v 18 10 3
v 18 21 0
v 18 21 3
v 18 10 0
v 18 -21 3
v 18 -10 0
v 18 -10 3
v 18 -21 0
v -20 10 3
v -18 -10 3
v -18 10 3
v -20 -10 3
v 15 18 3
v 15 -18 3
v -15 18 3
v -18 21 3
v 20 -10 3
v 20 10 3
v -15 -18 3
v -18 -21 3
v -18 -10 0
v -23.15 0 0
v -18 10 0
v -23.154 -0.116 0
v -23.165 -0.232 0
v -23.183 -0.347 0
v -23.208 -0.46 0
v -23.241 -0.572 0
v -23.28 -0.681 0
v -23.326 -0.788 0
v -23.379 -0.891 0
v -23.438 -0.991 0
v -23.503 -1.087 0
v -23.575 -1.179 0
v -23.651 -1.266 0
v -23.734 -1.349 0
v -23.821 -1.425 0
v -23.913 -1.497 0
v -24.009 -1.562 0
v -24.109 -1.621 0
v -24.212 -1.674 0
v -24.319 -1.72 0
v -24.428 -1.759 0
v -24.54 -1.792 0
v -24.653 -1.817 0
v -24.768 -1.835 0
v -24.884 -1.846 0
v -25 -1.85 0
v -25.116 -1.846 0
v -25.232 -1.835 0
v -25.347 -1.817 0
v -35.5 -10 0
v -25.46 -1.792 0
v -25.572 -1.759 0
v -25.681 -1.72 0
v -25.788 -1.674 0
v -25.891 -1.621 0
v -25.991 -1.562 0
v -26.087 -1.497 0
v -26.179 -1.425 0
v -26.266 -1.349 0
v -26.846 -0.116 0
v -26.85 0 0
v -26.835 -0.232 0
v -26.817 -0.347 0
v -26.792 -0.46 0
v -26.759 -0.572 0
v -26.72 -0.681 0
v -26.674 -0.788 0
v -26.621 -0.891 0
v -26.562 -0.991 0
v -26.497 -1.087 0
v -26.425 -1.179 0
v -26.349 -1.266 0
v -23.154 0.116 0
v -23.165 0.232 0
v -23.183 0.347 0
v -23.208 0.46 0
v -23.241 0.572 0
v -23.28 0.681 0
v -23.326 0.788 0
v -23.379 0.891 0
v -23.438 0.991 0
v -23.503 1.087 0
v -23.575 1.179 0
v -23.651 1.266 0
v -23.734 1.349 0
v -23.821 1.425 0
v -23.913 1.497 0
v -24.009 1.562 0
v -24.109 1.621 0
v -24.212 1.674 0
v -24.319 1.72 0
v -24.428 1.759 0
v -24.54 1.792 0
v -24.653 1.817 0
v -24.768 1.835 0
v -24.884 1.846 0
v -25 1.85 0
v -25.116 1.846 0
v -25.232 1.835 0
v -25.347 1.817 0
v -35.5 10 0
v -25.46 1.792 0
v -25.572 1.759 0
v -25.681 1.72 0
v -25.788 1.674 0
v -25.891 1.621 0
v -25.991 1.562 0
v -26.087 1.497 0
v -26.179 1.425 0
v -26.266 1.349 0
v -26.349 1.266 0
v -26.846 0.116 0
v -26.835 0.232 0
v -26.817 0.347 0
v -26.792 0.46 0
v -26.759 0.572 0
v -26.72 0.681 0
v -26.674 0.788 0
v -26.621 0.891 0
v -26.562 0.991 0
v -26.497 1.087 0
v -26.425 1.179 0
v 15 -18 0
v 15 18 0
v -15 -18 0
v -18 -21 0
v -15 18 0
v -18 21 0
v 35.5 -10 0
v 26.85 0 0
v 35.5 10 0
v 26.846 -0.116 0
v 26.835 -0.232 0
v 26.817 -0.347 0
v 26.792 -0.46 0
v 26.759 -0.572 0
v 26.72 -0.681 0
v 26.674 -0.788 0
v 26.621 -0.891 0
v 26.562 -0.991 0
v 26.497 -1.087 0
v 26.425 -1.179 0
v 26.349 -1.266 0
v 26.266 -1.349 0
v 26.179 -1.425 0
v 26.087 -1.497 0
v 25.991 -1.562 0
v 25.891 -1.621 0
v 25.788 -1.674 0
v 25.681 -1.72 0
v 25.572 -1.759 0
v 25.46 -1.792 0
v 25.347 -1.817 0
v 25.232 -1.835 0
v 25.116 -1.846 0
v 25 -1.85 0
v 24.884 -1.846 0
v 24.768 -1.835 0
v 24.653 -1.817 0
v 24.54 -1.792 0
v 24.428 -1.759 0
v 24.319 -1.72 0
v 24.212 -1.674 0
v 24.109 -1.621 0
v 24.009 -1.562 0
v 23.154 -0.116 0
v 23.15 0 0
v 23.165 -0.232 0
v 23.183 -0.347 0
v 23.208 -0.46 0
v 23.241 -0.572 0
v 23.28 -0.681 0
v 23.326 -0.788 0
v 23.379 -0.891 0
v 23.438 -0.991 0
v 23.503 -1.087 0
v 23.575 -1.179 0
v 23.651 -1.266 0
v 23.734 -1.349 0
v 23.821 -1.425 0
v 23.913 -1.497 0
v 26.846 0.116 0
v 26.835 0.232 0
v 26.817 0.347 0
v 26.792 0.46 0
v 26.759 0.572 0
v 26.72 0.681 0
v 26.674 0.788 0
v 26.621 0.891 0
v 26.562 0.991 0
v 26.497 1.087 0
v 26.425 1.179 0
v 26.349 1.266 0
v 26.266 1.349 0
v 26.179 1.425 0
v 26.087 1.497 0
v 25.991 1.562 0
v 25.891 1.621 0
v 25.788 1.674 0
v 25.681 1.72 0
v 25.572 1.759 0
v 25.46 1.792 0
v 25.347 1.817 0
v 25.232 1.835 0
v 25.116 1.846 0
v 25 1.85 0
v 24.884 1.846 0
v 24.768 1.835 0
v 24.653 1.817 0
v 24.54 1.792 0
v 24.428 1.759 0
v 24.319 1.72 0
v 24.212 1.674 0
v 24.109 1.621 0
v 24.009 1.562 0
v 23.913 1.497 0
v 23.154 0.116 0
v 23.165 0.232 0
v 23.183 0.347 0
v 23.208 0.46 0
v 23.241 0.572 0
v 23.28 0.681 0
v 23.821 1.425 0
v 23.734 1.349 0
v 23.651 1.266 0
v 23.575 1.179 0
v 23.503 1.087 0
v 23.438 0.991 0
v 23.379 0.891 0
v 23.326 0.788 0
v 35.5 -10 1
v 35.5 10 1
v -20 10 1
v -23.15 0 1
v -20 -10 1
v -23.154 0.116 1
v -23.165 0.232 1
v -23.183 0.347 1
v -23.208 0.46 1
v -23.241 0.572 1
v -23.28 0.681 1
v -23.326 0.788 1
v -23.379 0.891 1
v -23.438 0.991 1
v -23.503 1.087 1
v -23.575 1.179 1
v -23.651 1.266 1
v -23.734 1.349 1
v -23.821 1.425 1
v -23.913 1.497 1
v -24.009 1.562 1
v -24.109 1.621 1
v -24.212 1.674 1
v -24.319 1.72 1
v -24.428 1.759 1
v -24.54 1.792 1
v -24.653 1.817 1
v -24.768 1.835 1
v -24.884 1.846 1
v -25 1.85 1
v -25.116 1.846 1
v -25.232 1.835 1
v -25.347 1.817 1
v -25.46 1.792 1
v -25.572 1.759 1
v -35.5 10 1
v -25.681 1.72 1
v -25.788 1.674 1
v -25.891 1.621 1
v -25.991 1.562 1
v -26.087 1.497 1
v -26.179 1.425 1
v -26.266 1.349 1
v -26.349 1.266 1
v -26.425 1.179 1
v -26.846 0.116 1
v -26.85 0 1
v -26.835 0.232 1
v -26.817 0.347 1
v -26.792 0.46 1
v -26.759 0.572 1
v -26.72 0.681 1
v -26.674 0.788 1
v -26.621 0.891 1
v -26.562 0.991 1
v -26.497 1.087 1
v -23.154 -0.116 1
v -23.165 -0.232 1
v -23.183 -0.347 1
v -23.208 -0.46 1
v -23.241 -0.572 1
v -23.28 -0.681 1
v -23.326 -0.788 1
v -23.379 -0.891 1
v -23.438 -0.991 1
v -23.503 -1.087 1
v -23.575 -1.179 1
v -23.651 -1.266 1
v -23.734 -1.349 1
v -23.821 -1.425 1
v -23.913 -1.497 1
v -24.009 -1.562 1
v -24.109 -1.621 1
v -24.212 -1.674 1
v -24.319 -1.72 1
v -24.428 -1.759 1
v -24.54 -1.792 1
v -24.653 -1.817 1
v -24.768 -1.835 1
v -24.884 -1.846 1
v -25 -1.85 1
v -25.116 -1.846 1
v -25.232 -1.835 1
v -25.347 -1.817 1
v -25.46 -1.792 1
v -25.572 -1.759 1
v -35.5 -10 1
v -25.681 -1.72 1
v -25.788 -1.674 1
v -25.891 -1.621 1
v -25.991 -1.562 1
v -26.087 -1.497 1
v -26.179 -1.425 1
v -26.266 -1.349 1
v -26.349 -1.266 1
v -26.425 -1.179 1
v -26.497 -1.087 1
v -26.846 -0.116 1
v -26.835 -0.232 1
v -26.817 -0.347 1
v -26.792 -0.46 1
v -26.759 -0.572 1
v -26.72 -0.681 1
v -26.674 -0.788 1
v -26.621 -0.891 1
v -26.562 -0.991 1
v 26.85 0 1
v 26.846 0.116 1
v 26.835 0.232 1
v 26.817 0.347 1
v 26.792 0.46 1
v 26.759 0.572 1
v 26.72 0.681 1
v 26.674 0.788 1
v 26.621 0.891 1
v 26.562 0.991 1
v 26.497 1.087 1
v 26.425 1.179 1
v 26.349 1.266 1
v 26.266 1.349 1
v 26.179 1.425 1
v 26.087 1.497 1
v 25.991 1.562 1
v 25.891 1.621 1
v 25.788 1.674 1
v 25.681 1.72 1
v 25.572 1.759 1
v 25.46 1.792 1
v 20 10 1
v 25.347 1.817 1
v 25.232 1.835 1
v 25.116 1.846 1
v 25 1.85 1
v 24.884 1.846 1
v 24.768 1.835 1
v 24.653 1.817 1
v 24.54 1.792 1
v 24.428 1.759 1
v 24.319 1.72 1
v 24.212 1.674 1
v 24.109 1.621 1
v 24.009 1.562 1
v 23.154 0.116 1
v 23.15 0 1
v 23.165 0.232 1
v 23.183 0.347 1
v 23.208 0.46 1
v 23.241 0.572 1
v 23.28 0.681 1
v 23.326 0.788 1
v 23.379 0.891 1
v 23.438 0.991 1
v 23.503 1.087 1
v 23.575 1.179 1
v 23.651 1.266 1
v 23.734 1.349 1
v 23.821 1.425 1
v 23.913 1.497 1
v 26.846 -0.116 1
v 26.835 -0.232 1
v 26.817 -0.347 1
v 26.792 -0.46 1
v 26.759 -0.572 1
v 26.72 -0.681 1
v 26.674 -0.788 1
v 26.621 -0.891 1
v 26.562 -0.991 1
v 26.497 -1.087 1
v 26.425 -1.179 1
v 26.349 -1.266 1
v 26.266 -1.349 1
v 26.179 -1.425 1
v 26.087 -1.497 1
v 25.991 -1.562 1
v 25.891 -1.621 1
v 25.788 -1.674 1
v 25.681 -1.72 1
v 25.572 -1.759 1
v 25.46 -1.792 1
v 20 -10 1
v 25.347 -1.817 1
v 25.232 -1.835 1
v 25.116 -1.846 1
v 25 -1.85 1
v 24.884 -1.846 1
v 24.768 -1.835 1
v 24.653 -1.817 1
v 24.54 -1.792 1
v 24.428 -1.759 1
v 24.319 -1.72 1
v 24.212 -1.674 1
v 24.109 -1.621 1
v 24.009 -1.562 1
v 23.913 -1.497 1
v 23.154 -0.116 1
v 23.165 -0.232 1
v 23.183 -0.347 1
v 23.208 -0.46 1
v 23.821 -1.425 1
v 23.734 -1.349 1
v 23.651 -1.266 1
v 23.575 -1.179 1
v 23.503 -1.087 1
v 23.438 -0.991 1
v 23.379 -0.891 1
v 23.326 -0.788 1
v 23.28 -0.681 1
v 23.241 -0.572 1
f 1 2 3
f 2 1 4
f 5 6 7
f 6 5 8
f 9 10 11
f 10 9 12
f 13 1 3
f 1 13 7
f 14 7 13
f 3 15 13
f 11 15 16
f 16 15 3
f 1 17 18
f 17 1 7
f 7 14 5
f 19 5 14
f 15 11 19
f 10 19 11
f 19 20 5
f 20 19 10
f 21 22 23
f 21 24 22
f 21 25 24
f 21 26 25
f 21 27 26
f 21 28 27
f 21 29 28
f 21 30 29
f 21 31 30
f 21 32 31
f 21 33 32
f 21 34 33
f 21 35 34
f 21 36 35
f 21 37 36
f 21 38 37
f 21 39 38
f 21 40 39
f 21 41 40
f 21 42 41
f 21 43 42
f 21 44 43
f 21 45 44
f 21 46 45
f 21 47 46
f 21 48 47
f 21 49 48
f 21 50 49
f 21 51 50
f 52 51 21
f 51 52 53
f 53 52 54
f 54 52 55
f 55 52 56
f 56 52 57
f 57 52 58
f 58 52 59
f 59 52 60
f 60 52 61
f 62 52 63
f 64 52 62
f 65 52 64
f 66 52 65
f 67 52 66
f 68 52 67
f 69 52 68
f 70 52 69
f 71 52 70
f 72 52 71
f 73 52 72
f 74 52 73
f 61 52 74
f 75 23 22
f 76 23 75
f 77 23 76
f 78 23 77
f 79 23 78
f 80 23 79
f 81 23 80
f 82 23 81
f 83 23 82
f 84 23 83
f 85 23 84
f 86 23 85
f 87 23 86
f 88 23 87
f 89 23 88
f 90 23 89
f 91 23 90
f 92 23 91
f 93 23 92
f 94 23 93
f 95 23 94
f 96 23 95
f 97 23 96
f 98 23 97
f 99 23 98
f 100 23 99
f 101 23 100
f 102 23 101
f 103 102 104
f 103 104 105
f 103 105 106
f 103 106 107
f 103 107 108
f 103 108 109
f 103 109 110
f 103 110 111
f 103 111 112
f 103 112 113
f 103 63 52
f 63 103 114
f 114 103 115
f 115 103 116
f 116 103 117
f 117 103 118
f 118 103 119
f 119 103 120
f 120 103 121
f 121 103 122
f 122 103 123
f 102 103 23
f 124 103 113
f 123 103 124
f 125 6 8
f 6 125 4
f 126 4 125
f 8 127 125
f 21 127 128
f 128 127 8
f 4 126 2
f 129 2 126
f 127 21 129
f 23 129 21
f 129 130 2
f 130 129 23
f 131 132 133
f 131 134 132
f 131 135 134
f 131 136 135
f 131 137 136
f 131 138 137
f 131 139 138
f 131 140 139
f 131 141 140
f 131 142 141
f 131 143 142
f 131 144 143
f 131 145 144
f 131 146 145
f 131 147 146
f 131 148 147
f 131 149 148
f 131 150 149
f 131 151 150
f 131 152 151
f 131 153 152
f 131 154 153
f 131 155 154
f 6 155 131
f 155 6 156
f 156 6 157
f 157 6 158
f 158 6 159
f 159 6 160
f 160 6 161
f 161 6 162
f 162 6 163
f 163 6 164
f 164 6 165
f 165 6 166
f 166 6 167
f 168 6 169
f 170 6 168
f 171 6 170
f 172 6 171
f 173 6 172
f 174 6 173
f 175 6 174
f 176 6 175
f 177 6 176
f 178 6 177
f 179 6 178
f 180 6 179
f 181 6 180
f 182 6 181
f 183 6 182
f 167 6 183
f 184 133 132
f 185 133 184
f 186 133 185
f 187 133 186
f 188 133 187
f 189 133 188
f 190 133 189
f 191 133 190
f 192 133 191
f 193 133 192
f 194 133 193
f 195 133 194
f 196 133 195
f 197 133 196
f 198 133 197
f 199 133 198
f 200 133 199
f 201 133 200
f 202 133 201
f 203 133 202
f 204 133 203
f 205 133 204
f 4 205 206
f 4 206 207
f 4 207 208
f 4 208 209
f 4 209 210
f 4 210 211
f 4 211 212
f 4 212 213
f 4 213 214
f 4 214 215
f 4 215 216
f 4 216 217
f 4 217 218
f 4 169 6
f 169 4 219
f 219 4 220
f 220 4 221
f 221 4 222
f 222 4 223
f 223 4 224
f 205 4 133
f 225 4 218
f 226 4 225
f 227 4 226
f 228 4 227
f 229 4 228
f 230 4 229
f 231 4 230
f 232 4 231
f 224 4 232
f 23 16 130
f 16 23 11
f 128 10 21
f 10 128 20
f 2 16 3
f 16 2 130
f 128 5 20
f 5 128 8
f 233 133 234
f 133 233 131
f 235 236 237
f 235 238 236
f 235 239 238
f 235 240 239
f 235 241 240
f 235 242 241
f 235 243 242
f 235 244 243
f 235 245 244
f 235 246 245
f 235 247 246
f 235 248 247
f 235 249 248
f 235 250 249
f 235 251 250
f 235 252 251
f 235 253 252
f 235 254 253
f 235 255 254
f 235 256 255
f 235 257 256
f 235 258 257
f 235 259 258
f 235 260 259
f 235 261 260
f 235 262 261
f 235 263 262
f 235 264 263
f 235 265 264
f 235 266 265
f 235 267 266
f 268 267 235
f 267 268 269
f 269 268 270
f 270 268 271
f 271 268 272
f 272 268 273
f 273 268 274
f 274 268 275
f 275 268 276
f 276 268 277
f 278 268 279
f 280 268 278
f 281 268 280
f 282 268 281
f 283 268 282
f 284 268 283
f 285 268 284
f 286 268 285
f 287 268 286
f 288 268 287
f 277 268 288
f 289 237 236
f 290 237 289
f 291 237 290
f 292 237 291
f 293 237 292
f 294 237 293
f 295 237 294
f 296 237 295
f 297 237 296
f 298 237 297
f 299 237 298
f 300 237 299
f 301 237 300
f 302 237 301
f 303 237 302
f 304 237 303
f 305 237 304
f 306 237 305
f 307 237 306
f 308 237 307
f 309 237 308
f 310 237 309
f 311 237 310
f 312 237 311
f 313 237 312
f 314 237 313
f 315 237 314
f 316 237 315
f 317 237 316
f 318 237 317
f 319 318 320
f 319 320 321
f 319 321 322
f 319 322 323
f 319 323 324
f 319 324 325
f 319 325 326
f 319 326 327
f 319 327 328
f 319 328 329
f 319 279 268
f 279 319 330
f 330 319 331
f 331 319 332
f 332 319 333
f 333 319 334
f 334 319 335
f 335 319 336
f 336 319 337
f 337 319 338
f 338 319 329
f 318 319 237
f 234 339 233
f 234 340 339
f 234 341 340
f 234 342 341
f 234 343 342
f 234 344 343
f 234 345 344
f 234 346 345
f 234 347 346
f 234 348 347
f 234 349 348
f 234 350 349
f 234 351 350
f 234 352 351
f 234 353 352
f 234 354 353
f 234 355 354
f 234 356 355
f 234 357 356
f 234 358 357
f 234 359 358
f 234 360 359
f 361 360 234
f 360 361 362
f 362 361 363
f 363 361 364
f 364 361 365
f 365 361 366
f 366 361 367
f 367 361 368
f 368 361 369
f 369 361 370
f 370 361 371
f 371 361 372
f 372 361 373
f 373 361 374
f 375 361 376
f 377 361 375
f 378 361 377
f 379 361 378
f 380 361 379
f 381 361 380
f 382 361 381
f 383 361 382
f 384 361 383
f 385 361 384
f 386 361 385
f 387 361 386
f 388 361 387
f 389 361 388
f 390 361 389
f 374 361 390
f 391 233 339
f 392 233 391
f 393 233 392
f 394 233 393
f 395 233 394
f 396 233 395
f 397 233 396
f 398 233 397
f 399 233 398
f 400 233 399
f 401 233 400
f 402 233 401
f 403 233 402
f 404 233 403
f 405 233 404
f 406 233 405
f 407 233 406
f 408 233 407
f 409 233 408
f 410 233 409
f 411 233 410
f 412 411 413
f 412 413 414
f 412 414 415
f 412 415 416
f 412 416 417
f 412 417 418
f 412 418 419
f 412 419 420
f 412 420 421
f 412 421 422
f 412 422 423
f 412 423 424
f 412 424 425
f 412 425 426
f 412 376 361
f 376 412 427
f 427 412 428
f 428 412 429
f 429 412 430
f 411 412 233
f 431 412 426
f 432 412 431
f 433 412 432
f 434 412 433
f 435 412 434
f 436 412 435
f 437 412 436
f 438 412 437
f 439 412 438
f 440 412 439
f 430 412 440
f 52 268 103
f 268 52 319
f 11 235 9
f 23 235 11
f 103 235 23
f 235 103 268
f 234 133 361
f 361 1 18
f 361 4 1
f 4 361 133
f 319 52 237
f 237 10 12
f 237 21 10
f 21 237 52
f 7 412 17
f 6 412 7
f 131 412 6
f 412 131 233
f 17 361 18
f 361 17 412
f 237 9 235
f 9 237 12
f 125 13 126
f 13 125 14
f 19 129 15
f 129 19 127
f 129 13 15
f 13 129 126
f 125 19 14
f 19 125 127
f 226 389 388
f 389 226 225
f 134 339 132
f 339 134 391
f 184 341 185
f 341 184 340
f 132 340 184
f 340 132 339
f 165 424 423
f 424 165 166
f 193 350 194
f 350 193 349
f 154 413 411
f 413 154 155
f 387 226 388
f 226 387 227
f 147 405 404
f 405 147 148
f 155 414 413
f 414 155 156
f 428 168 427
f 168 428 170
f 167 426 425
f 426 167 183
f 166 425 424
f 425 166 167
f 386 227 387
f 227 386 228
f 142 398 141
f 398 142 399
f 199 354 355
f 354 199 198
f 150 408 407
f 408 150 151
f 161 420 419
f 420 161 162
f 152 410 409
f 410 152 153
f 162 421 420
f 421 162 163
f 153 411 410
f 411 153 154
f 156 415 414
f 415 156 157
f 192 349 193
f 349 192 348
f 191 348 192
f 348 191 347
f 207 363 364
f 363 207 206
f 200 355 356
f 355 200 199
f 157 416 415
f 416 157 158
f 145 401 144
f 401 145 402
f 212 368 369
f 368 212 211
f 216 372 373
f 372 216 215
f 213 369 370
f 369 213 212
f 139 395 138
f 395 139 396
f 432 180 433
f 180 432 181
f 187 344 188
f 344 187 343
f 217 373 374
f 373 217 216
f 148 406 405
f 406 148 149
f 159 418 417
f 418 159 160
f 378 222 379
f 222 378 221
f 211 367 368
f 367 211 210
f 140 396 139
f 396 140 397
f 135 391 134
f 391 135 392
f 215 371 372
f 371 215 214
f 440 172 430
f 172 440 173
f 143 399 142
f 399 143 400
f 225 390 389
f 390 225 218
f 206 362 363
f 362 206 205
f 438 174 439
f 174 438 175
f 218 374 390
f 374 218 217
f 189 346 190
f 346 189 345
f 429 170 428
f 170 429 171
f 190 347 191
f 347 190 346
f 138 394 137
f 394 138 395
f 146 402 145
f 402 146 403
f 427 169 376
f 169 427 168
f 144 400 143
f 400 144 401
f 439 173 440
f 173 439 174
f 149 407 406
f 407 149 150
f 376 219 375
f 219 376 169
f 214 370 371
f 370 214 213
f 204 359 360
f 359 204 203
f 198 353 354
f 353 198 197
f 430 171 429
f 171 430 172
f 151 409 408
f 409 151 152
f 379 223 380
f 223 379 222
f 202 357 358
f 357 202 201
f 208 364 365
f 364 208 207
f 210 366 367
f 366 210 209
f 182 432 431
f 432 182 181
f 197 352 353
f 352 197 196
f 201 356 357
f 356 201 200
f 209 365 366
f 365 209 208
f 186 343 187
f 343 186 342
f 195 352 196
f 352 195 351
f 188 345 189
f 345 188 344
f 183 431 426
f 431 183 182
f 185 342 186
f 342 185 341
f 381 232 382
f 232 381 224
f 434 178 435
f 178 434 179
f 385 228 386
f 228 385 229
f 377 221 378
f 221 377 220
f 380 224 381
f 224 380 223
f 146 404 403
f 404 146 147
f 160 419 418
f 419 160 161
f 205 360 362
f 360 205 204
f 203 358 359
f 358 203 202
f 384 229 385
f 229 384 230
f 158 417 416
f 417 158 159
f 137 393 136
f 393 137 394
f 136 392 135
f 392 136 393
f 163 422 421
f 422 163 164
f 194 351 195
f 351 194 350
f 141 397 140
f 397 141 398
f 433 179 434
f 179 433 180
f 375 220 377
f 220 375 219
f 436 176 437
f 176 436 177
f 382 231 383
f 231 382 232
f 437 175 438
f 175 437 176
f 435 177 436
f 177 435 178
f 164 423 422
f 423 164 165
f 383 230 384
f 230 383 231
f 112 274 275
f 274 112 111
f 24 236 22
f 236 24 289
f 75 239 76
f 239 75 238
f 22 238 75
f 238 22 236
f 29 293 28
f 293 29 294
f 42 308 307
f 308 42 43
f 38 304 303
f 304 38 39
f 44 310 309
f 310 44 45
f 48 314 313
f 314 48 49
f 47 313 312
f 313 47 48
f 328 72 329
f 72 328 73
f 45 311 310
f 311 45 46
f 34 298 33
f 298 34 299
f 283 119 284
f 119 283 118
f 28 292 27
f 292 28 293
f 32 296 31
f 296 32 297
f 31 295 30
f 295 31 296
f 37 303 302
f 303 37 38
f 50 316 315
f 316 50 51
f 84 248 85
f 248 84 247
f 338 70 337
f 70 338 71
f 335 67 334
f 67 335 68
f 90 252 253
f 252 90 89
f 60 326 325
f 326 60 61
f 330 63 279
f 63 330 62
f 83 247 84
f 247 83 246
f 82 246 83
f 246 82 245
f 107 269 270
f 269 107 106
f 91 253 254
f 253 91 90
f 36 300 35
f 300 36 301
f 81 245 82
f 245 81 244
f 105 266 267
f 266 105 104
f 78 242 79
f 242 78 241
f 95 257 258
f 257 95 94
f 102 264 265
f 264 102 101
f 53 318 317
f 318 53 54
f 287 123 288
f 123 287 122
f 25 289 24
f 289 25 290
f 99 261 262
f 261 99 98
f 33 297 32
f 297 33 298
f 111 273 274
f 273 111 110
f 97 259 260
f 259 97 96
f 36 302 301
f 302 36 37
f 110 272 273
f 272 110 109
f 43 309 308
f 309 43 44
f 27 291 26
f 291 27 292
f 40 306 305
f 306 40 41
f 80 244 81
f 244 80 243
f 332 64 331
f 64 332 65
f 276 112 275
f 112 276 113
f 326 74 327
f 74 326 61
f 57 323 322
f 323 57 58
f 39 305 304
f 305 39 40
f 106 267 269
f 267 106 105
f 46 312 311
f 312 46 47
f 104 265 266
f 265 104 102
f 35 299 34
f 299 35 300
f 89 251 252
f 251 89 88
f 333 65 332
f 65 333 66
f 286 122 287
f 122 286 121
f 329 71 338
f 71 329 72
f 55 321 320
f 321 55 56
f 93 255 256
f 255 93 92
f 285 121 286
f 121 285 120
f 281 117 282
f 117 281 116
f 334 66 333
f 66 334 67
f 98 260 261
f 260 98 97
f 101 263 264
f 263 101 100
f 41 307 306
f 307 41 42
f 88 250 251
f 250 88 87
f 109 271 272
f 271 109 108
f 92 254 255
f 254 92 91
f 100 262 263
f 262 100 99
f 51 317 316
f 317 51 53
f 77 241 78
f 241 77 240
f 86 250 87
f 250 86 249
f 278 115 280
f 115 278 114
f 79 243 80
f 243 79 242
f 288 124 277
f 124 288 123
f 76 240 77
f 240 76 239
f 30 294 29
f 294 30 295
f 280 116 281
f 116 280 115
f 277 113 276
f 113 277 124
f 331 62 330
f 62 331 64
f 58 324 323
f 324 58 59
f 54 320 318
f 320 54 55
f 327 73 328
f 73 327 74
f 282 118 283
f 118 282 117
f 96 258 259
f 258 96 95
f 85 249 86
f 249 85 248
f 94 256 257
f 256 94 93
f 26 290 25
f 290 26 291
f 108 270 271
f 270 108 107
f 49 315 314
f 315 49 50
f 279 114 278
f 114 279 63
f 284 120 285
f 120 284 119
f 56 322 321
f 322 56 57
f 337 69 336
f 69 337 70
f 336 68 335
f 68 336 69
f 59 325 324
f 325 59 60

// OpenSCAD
difference(){
	union(){


        translate([-36/2,-42/2,0]){
              cube([36,42,3], center=false);
        }
        
        
     

        translate([-71/2,-10,0]){
            cube([71,20,1], center=false);
        }         

        translate([-40/2,-10,0]){
            cube([40,20,3], center=false);
        }         

    


	}
	union() {
        translate([-30/2,-36/2,-1]){
            cube([30,36,50], center=false);
       }

  
        translate([15+10,0,-1]){
            rotate([0,0,0]){
                cylinder(h=52, r=3.7/2, $fn=100, center=false);
            }
        }
        translate([-15-10,0,-1]){
            rotate([0,0,0]){
                cylinder(h=52, r=3.7/2, $fn=100, center=false);
            }
        }


      
	}
}
